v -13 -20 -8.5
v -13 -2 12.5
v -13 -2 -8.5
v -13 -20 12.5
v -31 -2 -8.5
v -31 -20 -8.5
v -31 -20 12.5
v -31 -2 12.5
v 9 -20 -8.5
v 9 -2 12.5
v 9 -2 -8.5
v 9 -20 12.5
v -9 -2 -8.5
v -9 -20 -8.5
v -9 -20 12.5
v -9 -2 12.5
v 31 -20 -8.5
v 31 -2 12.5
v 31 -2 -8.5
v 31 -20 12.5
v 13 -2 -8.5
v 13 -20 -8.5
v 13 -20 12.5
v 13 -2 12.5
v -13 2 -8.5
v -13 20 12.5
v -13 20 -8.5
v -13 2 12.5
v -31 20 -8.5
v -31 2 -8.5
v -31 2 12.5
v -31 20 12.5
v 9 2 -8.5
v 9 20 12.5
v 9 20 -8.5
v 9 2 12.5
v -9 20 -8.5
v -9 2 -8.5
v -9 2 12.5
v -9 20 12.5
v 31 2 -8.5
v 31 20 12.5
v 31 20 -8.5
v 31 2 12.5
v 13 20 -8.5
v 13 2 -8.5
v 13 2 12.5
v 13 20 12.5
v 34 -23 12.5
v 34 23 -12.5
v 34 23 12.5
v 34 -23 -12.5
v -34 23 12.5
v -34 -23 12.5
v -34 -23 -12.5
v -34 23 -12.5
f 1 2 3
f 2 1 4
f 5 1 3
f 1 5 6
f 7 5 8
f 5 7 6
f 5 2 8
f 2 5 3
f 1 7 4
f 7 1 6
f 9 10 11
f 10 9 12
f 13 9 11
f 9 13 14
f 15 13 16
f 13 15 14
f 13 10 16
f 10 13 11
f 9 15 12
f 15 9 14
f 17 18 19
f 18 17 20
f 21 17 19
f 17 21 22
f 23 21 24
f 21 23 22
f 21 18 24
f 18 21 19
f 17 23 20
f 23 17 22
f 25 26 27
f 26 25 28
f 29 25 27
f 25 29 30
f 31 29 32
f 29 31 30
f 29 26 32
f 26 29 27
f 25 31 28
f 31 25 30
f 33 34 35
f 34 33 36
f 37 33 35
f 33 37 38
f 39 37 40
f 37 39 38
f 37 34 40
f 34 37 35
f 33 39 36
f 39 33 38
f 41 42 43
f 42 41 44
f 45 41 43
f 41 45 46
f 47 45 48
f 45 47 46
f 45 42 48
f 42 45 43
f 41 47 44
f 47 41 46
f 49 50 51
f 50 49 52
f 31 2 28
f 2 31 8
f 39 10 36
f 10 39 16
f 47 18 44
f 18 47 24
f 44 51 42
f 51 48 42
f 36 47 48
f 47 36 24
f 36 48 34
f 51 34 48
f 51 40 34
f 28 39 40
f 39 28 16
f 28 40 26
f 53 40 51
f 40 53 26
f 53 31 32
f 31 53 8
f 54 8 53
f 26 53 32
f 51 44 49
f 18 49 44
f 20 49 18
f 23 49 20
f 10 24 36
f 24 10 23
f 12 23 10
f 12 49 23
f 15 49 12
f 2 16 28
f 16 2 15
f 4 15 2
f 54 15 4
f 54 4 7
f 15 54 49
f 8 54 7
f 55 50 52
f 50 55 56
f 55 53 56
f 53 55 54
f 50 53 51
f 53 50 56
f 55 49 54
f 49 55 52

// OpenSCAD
$fn = 32;

// ----------------------------------------------------------------------
// Pocket plate 68 x 46 x 25
// 2 x 3 pockets 18 mm square, 21 mm deep
// ----------------------------------------------------------------------

// --- parameters (mm) ---
thickness = 25;  // plate thickness
floor_t = 4;     // material left under each pocket
pocket = 18;     // pocket side length
pitch_x = 22;    // pocket pitch along X
pitch_y = 22;    // pocket pitch along Y
cols = 3;        // pockets per row
rows = 2;        // rows of pockets

// --- derived feature positions (mm) ---
depth = thickness - floor_t;        // = 21   pocket depth, down to the floor
span_x = (cols - 1) * pitch_x;      // = 44   distance between outer pockets
span_y = (rows - 1) * pitch_y;      // = 22   distance between outer pocket rows
origin_x = -span_x / 2;             // = -22   X of the first pocket
origin_y = -span_y / 2;             // = -11   Y of the first pocket
plate = [span_x + pocket + 6, span_y + pocket + 6, thickness];  // = [68, 46, 25]   overall size: pockets plus 3 mm of wall on each side
feature_centers = [
  [origin_x + 0 * pitch_x, origin_y + 0 * pitch_y],
  [origin_x + 1 * pitch_x, origin_y + 0 * pitch_y],
  [origin_x + 2 * pitch_x, origin_y + 0 * pitch_y],
  [origin_x + 0 * pitch_x, origin_y + 1 * pitch_y],
  [origin_x + 1 * pitch_x, origin_y + 1 * pitch_y],
  [origin_x + 2 * pitch_x, origin_y + 1 * pitch_y]
];   // pocket centres, used verbatim by the cutter loop

// plate outline, then one pocket per centre in feature_centers
difference() {
  cube(plate, center = true);
  for (centre = feature_centers)
    translate([centre[0] - pocket / 2, centre[1] - pocket / 2, plate[2] / 2 - depth])
      cube([pocket, pocket, depth + 1]);  // centred on the declared pocket centre
}
